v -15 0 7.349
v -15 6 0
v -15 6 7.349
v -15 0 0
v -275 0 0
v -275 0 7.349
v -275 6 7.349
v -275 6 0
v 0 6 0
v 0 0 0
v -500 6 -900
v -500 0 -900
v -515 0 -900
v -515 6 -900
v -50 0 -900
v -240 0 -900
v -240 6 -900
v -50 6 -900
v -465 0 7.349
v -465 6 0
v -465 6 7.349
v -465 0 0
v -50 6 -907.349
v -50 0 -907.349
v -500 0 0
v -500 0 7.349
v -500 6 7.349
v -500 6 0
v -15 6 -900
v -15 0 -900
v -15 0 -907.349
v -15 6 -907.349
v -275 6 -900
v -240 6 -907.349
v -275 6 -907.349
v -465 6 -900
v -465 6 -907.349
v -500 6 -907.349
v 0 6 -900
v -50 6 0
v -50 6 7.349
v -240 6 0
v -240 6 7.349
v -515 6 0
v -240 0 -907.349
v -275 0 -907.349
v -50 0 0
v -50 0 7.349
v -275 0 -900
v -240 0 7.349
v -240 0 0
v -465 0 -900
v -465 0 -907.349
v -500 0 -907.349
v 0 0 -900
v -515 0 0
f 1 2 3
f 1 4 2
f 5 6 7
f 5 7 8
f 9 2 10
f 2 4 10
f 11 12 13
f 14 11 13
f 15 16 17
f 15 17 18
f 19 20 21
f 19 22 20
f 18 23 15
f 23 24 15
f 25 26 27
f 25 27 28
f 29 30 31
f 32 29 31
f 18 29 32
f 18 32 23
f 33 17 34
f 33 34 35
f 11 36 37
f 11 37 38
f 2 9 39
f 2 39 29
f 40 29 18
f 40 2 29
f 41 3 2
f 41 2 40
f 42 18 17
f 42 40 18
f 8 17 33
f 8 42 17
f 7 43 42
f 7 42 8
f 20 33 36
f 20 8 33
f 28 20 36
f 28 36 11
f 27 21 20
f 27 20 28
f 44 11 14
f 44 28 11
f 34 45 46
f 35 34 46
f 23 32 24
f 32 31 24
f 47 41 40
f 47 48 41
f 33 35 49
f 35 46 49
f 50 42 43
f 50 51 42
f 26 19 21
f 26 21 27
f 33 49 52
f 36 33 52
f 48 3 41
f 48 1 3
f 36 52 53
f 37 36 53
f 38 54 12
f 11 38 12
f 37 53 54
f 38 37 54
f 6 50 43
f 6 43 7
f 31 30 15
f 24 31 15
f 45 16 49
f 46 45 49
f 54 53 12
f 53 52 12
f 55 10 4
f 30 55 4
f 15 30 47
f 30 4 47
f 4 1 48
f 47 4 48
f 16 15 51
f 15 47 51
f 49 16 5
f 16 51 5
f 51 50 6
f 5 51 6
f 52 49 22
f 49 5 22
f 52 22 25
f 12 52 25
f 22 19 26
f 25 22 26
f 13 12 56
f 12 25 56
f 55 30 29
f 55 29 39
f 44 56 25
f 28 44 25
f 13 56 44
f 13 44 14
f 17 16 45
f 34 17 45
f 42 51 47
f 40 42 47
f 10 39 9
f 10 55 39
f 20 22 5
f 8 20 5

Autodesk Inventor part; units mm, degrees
ref_plane "YZ Plane" through (0, 0, 0) normal (1, 0, 0) x (0, 1, 0)
ref_plane "XZ Plane" through (0, 0, 0) normal (0, 1, 0) x (-1, 0, 0)
ref_plane "XY Plane" through (0, 0, 0) normal (0, 0, 1) x (1, 0, 0)
sketch "Sketch1" plane through (0, 0, 0) normal (0, 1, 0) x (-1, 0, 0)
  line L0 (0, 0) -> (515, 0) construction
  line L1 (515, 0) -> (515, -900)
  line L2 (515, -900) -> (0, -900) construction
  line L3 (0, -900) -> (0, 0)
  line L4 (500, 0) -> (465, 0) construction
  line L5 (465, 0) -> (465, 7.3489)
  line L6 (465, 7.3489) -> (500, 7.3489)
  line L7 (500, 7.3489) -> (500, 0)
  line L8 (275, 0) -> (240, 0) construction
  line L9 (240, 0) -> (240, 7.3489)
  line L10 (240, 7.3489) -> (275, 7.3489)
  line L11 (275, 7.3489) -> (275, 0)
  line L12 (515, 0) -> (500, 0)
  line L13 (0, 0) -> (240, 0) construction
  line L14 (465, 0) -> (275, 0)
  line L15 (0, -450) -> (515, -450) construction
  line L16 (465, -900) -> (465, -907.3489)
  line L17 (465, -907.3489) -> (500, -907.3489)
  line L18 (500, -907.3489) -> (500, -900)
  line L19 (240, -900) -> (240, -907.3489)
  line L20 (240, -907.3489) -> (275, -907.3489)
  line L21 (275, -907.3489) -> (275, -900)
  line L22 (0, -900) -> (240, -900) construction
  line L23 (275, -900) -> (465, -900)
  line L24 (500, -900) -> (515, -900)
  line L25 (50, 0) -> (15, 0) construction
  line L26 (15, 0) -> (15, 7.3489)
  line L27 (15, 7.3489) -> (50, 7.3489)
  line L28 (50, 7.3489) -> (50, 0)
  line L29 (240, 0) -> (50, 0)
  line L30 (15, 0) -> (0, 0)
  line L31 (50, -900) -> (15, -900) construction
  line L32 (15, -900) -> (15, -907.3489)
  line L33 (15, -907.3489) -> (50, -907.3489)
  line L34 (50, -907.3489) -> (50, -900)
  line L35 (240, -900) -> (50, -900)
  line L36 (15, -900) -> (0, -900)
  dimension "d0" = 900
  dimension "d1" = 515
  dimension "d4" = 35
  dimension "d5" = 35
  dimension "d6" = 190
  dimension "d7" = 15
  dimension "d8" = 240
  dimension "d9" = 190
extrude "Extrusion1" add sketch "Sketch1" along normal blind 6
properties part number "Superior_top" material "Wood (Oak)"
